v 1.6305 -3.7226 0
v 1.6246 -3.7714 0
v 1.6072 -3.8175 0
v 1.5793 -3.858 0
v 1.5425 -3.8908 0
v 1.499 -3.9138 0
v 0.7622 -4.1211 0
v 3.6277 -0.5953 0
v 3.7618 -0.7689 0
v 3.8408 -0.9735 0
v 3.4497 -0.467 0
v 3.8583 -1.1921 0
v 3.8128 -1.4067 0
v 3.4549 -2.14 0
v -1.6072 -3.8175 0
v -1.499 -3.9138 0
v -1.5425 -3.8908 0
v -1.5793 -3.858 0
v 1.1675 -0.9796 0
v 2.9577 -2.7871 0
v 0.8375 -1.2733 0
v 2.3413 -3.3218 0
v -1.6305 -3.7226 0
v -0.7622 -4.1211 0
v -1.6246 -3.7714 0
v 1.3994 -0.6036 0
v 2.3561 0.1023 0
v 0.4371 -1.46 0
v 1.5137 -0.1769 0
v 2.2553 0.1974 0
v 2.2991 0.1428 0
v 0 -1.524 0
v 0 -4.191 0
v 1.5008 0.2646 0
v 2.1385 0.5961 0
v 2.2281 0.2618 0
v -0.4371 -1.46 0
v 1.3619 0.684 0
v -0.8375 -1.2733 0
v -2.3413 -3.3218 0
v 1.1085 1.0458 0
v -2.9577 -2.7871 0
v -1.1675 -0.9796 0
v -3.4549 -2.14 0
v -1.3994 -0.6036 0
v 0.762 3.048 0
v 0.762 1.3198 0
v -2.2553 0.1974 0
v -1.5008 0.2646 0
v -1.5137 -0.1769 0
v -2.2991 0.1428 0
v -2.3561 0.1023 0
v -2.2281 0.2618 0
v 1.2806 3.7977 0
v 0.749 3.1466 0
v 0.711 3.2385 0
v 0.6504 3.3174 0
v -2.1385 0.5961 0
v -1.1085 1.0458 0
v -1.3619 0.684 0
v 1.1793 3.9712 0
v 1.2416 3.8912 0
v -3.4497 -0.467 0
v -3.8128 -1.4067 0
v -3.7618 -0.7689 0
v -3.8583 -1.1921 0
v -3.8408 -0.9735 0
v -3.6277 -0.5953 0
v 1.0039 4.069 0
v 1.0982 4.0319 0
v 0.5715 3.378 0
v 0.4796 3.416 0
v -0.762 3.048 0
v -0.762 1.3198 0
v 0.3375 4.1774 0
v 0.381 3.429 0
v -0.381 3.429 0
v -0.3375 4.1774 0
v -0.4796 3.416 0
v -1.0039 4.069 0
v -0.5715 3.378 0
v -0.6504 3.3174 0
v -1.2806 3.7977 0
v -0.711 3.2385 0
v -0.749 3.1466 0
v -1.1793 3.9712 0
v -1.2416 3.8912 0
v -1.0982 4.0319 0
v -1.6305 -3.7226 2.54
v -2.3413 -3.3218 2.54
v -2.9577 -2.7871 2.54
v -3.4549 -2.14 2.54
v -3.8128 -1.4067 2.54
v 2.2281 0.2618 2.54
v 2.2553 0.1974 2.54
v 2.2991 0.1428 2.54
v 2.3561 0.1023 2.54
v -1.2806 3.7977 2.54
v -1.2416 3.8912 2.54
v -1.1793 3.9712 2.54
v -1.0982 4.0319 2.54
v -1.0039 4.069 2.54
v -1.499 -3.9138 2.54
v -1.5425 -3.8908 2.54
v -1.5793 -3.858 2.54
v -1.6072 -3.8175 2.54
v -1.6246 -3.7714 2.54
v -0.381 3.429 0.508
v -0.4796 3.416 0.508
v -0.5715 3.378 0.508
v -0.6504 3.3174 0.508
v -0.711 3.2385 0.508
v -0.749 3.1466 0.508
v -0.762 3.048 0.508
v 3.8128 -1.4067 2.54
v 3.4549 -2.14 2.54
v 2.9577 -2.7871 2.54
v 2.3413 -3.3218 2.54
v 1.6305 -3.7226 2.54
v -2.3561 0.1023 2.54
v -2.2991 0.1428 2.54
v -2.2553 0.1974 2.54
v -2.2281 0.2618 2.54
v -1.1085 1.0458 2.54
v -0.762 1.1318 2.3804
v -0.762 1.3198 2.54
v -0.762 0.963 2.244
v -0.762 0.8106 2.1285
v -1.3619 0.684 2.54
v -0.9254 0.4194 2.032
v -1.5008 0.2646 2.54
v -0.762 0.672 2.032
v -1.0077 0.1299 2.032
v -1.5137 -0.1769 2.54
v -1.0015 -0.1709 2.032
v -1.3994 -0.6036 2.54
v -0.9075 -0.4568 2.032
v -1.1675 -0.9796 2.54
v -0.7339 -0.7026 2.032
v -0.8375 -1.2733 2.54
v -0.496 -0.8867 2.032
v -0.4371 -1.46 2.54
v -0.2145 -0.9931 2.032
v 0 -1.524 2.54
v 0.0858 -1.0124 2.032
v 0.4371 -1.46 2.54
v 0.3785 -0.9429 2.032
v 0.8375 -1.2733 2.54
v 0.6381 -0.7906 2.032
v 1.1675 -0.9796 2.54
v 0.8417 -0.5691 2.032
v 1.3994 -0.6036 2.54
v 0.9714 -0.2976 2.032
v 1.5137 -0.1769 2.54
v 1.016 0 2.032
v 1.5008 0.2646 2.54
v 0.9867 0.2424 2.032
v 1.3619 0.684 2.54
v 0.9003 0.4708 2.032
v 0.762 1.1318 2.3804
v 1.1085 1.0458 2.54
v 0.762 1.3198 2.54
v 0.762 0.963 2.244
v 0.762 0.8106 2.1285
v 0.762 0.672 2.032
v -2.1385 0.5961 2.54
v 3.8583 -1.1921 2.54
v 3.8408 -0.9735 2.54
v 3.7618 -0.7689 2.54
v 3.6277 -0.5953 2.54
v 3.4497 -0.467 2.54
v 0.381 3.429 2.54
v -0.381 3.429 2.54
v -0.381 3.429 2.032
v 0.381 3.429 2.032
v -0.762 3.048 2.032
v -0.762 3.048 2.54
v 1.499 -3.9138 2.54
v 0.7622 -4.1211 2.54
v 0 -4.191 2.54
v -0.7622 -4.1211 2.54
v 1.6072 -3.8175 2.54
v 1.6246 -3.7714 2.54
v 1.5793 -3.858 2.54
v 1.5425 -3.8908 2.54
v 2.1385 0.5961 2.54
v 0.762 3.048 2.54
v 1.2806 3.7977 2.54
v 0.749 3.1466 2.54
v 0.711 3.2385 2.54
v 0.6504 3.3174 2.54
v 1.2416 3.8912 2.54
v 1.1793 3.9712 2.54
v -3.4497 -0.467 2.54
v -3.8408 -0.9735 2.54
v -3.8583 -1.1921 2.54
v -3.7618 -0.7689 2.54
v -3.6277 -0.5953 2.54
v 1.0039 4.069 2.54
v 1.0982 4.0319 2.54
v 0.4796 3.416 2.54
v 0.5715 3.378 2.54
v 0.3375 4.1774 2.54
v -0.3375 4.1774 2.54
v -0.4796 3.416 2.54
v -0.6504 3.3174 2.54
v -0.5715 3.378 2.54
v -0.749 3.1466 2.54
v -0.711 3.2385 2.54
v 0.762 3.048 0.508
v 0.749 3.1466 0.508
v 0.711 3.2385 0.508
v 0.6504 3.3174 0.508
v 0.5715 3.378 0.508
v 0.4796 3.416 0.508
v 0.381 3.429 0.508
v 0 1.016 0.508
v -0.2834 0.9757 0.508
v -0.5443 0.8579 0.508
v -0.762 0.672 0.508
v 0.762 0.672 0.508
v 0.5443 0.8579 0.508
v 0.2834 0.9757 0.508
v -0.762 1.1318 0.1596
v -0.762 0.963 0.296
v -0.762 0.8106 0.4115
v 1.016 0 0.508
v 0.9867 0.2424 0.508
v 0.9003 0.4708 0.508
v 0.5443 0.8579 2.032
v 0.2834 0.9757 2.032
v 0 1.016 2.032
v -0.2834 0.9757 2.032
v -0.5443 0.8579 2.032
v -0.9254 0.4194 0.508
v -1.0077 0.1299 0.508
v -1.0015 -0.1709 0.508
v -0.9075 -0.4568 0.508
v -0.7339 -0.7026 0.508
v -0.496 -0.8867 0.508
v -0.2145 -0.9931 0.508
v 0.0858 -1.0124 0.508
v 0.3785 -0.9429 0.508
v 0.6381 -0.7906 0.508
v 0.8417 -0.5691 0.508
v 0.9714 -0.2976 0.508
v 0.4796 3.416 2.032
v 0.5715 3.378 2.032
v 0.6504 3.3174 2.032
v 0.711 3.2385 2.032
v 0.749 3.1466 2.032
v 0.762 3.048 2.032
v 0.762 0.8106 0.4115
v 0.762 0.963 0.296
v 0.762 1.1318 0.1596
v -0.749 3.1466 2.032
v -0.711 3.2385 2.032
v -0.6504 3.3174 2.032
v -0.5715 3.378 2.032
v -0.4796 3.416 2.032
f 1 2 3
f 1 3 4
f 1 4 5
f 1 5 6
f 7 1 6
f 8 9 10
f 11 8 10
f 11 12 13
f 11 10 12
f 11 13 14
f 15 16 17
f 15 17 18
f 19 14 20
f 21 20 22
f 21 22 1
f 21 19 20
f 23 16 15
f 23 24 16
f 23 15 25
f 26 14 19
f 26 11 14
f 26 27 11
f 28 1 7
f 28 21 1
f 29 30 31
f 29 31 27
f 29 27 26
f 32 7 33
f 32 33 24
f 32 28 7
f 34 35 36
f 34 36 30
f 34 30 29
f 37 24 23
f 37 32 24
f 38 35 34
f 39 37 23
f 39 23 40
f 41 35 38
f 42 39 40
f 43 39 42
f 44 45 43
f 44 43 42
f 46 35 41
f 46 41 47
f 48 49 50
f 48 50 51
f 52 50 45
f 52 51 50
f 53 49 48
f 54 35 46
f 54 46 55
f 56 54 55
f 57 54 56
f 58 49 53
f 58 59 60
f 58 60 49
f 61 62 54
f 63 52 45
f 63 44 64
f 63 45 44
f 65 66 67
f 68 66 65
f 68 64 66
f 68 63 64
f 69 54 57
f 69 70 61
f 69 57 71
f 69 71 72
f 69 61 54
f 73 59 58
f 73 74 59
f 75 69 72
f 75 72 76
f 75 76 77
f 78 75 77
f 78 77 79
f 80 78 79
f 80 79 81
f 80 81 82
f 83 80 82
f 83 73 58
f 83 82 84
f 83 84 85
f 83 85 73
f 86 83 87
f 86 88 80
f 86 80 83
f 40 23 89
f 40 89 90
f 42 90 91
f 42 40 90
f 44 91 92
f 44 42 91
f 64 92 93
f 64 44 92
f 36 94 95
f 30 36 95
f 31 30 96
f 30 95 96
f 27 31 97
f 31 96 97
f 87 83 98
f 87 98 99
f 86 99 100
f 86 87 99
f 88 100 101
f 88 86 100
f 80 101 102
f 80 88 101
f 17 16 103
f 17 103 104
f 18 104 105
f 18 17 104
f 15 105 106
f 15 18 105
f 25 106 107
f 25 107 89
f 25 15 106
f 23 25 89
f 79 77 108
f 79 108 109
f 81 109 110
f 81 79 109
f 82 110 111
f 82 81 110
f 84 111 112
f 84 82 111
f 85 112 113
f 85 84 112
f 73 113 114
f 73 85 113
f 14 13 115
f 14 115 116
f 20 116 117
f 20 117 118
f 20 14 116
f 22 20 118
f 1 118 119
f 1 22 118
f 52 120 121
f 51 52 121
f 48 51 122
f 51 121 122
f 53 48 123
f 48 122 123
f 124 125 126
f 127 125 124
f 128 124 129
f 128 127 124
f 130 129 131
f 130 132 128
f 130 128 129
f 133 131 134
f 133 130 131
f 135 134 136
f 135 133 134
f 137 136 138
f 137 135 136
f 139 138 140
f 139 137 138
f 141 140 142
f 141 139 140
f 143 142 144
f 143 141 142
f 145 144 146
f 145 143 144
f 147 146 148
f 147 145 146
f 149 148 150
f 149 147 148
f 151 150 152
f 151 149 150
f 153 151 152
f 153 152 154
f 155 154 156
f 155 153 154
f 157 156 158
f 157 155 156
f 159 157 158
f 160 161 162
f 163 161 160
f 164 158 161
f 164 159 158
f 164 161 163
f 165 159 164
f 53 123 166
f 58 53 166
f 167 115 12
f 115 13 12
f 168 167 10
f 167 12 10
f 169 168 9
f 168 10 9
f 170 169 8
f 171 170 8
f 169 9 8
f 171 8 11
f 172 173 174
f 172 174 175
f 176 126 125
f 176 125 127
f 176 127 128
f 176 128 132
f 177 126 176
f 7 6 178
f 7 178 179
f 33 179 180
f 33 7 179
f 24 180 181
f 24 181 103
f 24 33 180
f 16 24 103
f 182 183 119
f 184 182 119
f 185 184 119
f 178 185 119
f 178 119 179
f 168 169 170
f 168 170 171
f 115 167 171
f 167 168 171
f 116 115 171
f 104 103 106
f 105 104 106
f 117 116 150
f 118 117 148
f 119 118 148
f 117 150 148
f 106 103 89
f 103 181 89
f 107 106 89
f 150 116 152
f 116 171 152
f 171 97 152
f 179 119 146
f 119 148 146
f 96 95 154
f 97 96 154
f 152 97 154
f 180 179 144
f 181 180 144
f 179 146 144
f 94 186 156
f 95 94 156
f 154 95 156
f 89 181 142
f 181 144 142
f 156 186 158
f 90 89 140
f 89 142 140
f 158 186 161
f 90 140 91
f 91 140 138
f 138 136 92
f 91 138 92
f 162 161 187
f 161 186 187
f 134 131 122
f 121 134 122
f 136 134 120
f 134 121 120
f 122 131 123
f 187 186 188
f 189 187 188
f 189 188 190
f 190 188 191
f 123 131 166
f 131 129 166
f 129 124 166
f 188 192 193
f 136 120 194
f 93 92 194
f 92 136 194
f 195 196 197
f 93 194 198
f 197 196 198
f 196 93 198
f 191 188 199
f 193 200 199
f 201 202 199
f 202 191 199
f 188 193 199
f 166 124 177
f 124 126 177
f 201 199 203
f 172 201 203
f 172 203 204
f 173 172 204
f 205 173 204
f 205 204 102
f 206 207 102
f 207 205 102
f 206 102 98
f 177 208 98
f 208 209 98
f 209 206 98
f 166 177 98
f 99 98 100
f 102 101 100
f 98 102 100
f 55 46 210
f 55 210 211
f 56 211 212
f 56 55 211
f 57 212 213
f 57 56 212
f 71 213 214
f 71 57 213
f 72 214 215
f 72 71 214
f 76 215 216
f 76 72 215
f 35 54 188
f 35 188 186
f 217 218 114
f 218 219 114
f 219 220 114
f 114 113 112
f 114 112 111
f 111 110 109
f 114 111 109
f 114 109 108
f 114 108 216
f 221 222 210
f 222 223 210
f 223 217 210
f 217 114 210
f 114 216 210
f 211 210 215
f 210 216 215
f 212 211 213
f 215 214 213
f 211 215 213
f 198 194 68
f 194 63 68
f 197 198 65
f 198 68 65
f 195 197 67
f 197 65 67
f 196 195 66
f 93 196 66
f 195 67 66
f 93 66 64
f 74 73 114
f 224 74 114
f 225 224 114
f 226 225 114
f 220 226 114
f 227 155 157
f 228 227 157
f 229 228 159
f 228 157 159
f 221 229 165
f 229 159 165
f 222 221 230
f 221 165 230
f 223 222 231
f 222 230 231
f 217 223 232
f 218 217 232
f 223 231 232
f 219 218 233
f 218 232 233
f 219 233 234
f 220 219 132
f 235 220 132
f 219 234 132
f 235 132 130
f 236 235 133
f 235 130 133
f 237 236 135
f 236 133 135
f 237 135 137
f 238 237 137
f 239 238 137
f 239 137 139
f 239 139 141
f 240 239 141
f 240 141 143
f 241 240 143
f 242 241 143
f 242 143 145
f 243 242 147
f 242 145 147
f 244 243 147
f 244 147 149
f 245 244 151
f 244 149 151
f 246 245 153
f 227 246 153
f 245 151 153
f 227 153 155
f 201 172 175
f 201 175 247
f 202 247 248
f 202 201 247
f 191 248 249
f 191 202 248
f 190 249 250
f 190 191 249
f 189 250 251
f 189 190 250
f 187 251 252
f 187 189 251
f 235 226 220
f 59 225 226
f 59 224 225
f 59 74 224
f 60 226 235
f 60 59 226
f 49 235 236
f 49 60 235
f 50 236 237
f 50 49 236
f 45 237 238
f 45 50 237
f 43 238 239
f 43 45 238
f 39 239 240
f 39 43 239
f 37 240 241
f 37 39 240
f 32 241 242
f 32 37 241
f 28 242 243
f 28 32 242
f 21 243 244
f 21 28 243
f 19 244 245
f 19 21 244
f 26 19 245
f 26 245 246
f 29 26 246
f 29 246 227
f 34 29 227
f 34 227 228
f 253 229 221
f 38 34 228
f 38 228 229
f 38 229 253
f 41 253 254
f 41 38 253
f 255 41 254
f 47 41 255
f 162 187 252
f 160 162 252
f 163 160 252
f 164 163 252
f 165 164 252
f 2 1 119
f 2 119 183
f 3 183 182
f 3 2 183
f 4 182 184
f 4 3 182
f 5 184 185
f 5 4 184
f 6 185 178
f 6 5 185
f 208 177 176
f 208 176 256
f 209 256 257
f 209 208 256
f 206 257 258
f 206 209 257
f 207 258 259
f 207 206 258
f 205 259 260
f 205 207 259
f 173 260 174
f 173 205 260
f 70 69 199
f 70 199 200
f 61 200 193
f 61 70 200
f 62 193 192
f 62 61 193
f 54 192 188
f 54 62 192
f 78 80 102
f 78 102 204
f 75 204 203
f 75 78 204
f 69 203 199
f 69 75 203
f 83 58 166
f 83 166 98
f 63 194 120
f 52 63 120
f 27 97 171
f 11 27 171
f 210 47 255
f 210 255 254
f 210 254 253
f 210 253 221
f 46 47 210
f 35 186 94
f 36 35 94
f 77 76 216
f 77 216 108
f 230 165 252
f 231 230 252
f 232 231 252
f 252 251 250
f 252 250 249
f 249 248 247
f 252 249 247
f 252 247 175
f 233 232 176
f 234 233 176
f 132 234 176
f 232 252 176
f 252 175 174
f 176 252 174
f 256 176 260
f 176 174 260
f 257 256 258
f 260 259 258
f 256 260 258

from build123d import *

# Parameters (mm, degrees)
EXTRUDE1_DEPTH  = 2.54
EXTRUDE2_DEPTH  = 3.54
EXTRUDE3_DEPTH  = 3.54
FILLET1_R       = 0.762
SKETCH6_R       = 1.016
EXTRUDE6_DEPTH  = 3.54
EXTRUDE9_DEPTH  = 0.508
EXTRUDE10_DEPTH = 0.508


with BuildPart() as part:
    # Sketch1 → Extrude1 (new body)
    with BuildSketch(Plane.XY):
        with BuildLine():
            Line((-3.682902029, 0.407863494), (-2.38382675, 0.407863494))
            ThreePointArc((-2.38382675, 0.407863494), (-2.229201347, 0.460351745), (-2.13848159, 0.596123456))
            Line((-2.13848159, 0.596123456), (-1.280622225, 3.797698194))
            ThreePointArc((-1.280622225, 3.797698194), (-1.179315691, 3.971165577), (-1.003864933, 4.068996952))
            ThreePointArc((-1.003864933, 4.068996952), (0, 4.191), (1.003864933, 4.068996952))
            ThreePointArc((1.003864933, 4.068996952), (1.179315691, 3.971165577), (1.280622225, 3.797698194))
            Line((1.280622225, 3.797698194), (2.13848159, 0.596123456))
            ThreePointArc((2.13848159, 0.596123456), (2.229201347, 0.460351745), (2.38382675, 0.407863494))
            Line((2.38382675, 0.407863494), (3.682902029, 0.407863494))
            ThreePointArc((3.682902029, 0.407863494), (3.951325396, 0.297251911), (4.063891894, 0.029642476))
            ThreePointArc((4.063891894, 0.029642476), (3.409731918, -2.2112947), (1.63048159, -3.722583214))
            ThreePointArc((1.63048159, -3.722583214), (1.594432949, -3.838601921), (1.498982382, -3.913761978))
            ThreePointArc((1.498982382, -3.913761978), (0, -4.191), (-1.498982382, -3.913761978))
            ThreePointArc((-1.498982382, -3.913761978), (-1.594432949, -3.838601921), (-1.63048159, -3.722583214))
            ThreePointArc((-1.63048159, -3.722583214), (-3.409731918, -2.2112947), (-4.063891894, 0.029642476))
            ThreePointArc((-4.063891894, 0.029642476), (-3.951325396, 0.297251911), (-3.682902029, 0.407863494))
        make_face()
    extrude(amount=EXTRUDE1_DEPTH)

    # Sketch2 → Extrude2 (cut, through all)
    with BuildSketch(Plane.XY.offset(2.54)):
        with BuildLine():
            Line((-2.38382675, 0.407863494), (-3.682902029, 0.407863494))
            ThreePointArc((-3.682902029, 0.407863494), (-3.951325396, 0.297251911), (-4.063891894, 0.029642476))
            ThreePointArc((-4.063891894, 0.029642476), (-4.047838367, -0.362078102), (-3.994114692, -0.750429096))
            Line((-3.994114692, -0.750429096), (-2.356119493, 0.102257234))
            ThreePointArc((-2.356119493, 0.102257234), (-2.275312982, 0.168573423), (-2.228058481, 0.261817948))
            Line((-2.228058481, 0.261817948), (-2.13848159, 0.596123456))
            ThreePointArc((-2.13848159, 0.596123456), (-2.229201347, 0.460351745), (-2.38382675, 0.407863494))
        make_face()
    extrude(amount=-EXTRUDE2_DEPTH, mode=Mode.SUBTRACT)

    # Sketch3 → Extrude3 (cut, through all)
    with BuildSketch(Plane.XY.offset(2.54)):
        with BuildLine():
            Line((3.682902029, 0.407863494), (2.38382675, 0.407863494))
            ThreePointArc((2.38382675, 0.407863494), (2.229201347, 0.460351745), (2.13848159, 0.596123456))
            Line((2.13848159, 0.596123456), (2.228058481, 0.261817948))
            ThreePointArc((2.228058481, 0.261817948), (2.275312982, 0.168573423), (2.356119493, 0.102257234))
            Line((2.356119493, 0.102257234), (3.994114692, -0.750429096))
            ThreePointArc((3.994114692, -0.750429096), (4.047838367, -0.362078102), (4.063891894, 0.029642476))
            ThreePointArc((4.063891894, 0.029642476), (3.951325396, 0.297251911), (3.682902029, 0.407863494))
        make_face()
    extrude(amount=-EXTRUDE3_DEPTH, mode=Mode.SUBTRACT)

    # Fillet1
    fillet1_edges = [part.edges().sort_by_distance(p)[0] for p in [
        (-3.994114692, -0.750429096, 1.27),
        (3.994114692, -0.750429096, 1.27),
    ]]
    fillet(fillet1_edges, radius=FILLET1_R)

    # Sketch6 → Extrude6 (cut, through all)
    with BuildSketch(Plane.XY.offset(2.54)):
        Circle(SKETCH6_R)
    extrude(amount=-EXTRUDE6_DEPTH, mode=Mode.SUBTRACT)

    # Sketch11 → Cut-Revolve1 (revolve, cut)
    with BuildSketch(Plane(origin=(0, 0, 0), x_dir=(1, 0, 0), z_dir=(0, 1, 0))):
        Polygon((0, -2.54), (1.524, -2.54), (0.508, -1.524), (0.508, -1.016), (1.524, 0), (0, 0), align=None)
    revolve(axis=Axis((0, 0, 0), (0, 0, 1)), mode=Mode.SUBTRACT)

    # Sketch9 → Extrude9 (cut)
    with BuildSketch(Plane(origin=(0, 0, 0), x_dir=(-1, 0, 0), z_dir=(0, 0, -1))):
        with BuildLine():
            Line((-0.381, 3.429), (0.381, 3.429))
            ThreePointArc((0.381, 3.429), (0.650407684, 3.317407684), (0.762, 3.048))
            Line((0.762, 3.048), (0.762, 0.672020833))
            Line((0.762, 0.672020833), (-0.762, 0.672020833))
            Line((-0.762, 0.672020833), (-0.762, 3.048))
            ThreePointArc((-0.762, 3.048), (-0.650407684, 3.317407684), (-0.381, 3.429))
        make_face()
    extrude(amount=-EXTRUDE9_DEPTH, mode=Mode.SUBTRACT)

    # Sketch10 → Extrude10 (cut)
    with BuildSketch(Plane.XY.offset(2.54)):
        with BuildLine():
            Line((-0.381, 3.429), (0.381, 3.429))
            ThreePointArc((0.381, 3.429), (0.650407684, 3.317407684), (0.762, 3.048))
            Line((0.762, 3.048), (0.762, 0.672020833))
            Line((0.762, 0.672020833), (-0.762, 0.672020833))
            Line((-0.762, 0.672020833), (-0.762, 3.048))
            ThreePointArc((-0.762, 3.048), (-0.650407684, 3.317407684), (-0.381, 3.429))
        make_face()
    extrude(amount=-EXTRUDE10_DEPTH, mode=Mode.SUBTRACT)


solid = part.part
